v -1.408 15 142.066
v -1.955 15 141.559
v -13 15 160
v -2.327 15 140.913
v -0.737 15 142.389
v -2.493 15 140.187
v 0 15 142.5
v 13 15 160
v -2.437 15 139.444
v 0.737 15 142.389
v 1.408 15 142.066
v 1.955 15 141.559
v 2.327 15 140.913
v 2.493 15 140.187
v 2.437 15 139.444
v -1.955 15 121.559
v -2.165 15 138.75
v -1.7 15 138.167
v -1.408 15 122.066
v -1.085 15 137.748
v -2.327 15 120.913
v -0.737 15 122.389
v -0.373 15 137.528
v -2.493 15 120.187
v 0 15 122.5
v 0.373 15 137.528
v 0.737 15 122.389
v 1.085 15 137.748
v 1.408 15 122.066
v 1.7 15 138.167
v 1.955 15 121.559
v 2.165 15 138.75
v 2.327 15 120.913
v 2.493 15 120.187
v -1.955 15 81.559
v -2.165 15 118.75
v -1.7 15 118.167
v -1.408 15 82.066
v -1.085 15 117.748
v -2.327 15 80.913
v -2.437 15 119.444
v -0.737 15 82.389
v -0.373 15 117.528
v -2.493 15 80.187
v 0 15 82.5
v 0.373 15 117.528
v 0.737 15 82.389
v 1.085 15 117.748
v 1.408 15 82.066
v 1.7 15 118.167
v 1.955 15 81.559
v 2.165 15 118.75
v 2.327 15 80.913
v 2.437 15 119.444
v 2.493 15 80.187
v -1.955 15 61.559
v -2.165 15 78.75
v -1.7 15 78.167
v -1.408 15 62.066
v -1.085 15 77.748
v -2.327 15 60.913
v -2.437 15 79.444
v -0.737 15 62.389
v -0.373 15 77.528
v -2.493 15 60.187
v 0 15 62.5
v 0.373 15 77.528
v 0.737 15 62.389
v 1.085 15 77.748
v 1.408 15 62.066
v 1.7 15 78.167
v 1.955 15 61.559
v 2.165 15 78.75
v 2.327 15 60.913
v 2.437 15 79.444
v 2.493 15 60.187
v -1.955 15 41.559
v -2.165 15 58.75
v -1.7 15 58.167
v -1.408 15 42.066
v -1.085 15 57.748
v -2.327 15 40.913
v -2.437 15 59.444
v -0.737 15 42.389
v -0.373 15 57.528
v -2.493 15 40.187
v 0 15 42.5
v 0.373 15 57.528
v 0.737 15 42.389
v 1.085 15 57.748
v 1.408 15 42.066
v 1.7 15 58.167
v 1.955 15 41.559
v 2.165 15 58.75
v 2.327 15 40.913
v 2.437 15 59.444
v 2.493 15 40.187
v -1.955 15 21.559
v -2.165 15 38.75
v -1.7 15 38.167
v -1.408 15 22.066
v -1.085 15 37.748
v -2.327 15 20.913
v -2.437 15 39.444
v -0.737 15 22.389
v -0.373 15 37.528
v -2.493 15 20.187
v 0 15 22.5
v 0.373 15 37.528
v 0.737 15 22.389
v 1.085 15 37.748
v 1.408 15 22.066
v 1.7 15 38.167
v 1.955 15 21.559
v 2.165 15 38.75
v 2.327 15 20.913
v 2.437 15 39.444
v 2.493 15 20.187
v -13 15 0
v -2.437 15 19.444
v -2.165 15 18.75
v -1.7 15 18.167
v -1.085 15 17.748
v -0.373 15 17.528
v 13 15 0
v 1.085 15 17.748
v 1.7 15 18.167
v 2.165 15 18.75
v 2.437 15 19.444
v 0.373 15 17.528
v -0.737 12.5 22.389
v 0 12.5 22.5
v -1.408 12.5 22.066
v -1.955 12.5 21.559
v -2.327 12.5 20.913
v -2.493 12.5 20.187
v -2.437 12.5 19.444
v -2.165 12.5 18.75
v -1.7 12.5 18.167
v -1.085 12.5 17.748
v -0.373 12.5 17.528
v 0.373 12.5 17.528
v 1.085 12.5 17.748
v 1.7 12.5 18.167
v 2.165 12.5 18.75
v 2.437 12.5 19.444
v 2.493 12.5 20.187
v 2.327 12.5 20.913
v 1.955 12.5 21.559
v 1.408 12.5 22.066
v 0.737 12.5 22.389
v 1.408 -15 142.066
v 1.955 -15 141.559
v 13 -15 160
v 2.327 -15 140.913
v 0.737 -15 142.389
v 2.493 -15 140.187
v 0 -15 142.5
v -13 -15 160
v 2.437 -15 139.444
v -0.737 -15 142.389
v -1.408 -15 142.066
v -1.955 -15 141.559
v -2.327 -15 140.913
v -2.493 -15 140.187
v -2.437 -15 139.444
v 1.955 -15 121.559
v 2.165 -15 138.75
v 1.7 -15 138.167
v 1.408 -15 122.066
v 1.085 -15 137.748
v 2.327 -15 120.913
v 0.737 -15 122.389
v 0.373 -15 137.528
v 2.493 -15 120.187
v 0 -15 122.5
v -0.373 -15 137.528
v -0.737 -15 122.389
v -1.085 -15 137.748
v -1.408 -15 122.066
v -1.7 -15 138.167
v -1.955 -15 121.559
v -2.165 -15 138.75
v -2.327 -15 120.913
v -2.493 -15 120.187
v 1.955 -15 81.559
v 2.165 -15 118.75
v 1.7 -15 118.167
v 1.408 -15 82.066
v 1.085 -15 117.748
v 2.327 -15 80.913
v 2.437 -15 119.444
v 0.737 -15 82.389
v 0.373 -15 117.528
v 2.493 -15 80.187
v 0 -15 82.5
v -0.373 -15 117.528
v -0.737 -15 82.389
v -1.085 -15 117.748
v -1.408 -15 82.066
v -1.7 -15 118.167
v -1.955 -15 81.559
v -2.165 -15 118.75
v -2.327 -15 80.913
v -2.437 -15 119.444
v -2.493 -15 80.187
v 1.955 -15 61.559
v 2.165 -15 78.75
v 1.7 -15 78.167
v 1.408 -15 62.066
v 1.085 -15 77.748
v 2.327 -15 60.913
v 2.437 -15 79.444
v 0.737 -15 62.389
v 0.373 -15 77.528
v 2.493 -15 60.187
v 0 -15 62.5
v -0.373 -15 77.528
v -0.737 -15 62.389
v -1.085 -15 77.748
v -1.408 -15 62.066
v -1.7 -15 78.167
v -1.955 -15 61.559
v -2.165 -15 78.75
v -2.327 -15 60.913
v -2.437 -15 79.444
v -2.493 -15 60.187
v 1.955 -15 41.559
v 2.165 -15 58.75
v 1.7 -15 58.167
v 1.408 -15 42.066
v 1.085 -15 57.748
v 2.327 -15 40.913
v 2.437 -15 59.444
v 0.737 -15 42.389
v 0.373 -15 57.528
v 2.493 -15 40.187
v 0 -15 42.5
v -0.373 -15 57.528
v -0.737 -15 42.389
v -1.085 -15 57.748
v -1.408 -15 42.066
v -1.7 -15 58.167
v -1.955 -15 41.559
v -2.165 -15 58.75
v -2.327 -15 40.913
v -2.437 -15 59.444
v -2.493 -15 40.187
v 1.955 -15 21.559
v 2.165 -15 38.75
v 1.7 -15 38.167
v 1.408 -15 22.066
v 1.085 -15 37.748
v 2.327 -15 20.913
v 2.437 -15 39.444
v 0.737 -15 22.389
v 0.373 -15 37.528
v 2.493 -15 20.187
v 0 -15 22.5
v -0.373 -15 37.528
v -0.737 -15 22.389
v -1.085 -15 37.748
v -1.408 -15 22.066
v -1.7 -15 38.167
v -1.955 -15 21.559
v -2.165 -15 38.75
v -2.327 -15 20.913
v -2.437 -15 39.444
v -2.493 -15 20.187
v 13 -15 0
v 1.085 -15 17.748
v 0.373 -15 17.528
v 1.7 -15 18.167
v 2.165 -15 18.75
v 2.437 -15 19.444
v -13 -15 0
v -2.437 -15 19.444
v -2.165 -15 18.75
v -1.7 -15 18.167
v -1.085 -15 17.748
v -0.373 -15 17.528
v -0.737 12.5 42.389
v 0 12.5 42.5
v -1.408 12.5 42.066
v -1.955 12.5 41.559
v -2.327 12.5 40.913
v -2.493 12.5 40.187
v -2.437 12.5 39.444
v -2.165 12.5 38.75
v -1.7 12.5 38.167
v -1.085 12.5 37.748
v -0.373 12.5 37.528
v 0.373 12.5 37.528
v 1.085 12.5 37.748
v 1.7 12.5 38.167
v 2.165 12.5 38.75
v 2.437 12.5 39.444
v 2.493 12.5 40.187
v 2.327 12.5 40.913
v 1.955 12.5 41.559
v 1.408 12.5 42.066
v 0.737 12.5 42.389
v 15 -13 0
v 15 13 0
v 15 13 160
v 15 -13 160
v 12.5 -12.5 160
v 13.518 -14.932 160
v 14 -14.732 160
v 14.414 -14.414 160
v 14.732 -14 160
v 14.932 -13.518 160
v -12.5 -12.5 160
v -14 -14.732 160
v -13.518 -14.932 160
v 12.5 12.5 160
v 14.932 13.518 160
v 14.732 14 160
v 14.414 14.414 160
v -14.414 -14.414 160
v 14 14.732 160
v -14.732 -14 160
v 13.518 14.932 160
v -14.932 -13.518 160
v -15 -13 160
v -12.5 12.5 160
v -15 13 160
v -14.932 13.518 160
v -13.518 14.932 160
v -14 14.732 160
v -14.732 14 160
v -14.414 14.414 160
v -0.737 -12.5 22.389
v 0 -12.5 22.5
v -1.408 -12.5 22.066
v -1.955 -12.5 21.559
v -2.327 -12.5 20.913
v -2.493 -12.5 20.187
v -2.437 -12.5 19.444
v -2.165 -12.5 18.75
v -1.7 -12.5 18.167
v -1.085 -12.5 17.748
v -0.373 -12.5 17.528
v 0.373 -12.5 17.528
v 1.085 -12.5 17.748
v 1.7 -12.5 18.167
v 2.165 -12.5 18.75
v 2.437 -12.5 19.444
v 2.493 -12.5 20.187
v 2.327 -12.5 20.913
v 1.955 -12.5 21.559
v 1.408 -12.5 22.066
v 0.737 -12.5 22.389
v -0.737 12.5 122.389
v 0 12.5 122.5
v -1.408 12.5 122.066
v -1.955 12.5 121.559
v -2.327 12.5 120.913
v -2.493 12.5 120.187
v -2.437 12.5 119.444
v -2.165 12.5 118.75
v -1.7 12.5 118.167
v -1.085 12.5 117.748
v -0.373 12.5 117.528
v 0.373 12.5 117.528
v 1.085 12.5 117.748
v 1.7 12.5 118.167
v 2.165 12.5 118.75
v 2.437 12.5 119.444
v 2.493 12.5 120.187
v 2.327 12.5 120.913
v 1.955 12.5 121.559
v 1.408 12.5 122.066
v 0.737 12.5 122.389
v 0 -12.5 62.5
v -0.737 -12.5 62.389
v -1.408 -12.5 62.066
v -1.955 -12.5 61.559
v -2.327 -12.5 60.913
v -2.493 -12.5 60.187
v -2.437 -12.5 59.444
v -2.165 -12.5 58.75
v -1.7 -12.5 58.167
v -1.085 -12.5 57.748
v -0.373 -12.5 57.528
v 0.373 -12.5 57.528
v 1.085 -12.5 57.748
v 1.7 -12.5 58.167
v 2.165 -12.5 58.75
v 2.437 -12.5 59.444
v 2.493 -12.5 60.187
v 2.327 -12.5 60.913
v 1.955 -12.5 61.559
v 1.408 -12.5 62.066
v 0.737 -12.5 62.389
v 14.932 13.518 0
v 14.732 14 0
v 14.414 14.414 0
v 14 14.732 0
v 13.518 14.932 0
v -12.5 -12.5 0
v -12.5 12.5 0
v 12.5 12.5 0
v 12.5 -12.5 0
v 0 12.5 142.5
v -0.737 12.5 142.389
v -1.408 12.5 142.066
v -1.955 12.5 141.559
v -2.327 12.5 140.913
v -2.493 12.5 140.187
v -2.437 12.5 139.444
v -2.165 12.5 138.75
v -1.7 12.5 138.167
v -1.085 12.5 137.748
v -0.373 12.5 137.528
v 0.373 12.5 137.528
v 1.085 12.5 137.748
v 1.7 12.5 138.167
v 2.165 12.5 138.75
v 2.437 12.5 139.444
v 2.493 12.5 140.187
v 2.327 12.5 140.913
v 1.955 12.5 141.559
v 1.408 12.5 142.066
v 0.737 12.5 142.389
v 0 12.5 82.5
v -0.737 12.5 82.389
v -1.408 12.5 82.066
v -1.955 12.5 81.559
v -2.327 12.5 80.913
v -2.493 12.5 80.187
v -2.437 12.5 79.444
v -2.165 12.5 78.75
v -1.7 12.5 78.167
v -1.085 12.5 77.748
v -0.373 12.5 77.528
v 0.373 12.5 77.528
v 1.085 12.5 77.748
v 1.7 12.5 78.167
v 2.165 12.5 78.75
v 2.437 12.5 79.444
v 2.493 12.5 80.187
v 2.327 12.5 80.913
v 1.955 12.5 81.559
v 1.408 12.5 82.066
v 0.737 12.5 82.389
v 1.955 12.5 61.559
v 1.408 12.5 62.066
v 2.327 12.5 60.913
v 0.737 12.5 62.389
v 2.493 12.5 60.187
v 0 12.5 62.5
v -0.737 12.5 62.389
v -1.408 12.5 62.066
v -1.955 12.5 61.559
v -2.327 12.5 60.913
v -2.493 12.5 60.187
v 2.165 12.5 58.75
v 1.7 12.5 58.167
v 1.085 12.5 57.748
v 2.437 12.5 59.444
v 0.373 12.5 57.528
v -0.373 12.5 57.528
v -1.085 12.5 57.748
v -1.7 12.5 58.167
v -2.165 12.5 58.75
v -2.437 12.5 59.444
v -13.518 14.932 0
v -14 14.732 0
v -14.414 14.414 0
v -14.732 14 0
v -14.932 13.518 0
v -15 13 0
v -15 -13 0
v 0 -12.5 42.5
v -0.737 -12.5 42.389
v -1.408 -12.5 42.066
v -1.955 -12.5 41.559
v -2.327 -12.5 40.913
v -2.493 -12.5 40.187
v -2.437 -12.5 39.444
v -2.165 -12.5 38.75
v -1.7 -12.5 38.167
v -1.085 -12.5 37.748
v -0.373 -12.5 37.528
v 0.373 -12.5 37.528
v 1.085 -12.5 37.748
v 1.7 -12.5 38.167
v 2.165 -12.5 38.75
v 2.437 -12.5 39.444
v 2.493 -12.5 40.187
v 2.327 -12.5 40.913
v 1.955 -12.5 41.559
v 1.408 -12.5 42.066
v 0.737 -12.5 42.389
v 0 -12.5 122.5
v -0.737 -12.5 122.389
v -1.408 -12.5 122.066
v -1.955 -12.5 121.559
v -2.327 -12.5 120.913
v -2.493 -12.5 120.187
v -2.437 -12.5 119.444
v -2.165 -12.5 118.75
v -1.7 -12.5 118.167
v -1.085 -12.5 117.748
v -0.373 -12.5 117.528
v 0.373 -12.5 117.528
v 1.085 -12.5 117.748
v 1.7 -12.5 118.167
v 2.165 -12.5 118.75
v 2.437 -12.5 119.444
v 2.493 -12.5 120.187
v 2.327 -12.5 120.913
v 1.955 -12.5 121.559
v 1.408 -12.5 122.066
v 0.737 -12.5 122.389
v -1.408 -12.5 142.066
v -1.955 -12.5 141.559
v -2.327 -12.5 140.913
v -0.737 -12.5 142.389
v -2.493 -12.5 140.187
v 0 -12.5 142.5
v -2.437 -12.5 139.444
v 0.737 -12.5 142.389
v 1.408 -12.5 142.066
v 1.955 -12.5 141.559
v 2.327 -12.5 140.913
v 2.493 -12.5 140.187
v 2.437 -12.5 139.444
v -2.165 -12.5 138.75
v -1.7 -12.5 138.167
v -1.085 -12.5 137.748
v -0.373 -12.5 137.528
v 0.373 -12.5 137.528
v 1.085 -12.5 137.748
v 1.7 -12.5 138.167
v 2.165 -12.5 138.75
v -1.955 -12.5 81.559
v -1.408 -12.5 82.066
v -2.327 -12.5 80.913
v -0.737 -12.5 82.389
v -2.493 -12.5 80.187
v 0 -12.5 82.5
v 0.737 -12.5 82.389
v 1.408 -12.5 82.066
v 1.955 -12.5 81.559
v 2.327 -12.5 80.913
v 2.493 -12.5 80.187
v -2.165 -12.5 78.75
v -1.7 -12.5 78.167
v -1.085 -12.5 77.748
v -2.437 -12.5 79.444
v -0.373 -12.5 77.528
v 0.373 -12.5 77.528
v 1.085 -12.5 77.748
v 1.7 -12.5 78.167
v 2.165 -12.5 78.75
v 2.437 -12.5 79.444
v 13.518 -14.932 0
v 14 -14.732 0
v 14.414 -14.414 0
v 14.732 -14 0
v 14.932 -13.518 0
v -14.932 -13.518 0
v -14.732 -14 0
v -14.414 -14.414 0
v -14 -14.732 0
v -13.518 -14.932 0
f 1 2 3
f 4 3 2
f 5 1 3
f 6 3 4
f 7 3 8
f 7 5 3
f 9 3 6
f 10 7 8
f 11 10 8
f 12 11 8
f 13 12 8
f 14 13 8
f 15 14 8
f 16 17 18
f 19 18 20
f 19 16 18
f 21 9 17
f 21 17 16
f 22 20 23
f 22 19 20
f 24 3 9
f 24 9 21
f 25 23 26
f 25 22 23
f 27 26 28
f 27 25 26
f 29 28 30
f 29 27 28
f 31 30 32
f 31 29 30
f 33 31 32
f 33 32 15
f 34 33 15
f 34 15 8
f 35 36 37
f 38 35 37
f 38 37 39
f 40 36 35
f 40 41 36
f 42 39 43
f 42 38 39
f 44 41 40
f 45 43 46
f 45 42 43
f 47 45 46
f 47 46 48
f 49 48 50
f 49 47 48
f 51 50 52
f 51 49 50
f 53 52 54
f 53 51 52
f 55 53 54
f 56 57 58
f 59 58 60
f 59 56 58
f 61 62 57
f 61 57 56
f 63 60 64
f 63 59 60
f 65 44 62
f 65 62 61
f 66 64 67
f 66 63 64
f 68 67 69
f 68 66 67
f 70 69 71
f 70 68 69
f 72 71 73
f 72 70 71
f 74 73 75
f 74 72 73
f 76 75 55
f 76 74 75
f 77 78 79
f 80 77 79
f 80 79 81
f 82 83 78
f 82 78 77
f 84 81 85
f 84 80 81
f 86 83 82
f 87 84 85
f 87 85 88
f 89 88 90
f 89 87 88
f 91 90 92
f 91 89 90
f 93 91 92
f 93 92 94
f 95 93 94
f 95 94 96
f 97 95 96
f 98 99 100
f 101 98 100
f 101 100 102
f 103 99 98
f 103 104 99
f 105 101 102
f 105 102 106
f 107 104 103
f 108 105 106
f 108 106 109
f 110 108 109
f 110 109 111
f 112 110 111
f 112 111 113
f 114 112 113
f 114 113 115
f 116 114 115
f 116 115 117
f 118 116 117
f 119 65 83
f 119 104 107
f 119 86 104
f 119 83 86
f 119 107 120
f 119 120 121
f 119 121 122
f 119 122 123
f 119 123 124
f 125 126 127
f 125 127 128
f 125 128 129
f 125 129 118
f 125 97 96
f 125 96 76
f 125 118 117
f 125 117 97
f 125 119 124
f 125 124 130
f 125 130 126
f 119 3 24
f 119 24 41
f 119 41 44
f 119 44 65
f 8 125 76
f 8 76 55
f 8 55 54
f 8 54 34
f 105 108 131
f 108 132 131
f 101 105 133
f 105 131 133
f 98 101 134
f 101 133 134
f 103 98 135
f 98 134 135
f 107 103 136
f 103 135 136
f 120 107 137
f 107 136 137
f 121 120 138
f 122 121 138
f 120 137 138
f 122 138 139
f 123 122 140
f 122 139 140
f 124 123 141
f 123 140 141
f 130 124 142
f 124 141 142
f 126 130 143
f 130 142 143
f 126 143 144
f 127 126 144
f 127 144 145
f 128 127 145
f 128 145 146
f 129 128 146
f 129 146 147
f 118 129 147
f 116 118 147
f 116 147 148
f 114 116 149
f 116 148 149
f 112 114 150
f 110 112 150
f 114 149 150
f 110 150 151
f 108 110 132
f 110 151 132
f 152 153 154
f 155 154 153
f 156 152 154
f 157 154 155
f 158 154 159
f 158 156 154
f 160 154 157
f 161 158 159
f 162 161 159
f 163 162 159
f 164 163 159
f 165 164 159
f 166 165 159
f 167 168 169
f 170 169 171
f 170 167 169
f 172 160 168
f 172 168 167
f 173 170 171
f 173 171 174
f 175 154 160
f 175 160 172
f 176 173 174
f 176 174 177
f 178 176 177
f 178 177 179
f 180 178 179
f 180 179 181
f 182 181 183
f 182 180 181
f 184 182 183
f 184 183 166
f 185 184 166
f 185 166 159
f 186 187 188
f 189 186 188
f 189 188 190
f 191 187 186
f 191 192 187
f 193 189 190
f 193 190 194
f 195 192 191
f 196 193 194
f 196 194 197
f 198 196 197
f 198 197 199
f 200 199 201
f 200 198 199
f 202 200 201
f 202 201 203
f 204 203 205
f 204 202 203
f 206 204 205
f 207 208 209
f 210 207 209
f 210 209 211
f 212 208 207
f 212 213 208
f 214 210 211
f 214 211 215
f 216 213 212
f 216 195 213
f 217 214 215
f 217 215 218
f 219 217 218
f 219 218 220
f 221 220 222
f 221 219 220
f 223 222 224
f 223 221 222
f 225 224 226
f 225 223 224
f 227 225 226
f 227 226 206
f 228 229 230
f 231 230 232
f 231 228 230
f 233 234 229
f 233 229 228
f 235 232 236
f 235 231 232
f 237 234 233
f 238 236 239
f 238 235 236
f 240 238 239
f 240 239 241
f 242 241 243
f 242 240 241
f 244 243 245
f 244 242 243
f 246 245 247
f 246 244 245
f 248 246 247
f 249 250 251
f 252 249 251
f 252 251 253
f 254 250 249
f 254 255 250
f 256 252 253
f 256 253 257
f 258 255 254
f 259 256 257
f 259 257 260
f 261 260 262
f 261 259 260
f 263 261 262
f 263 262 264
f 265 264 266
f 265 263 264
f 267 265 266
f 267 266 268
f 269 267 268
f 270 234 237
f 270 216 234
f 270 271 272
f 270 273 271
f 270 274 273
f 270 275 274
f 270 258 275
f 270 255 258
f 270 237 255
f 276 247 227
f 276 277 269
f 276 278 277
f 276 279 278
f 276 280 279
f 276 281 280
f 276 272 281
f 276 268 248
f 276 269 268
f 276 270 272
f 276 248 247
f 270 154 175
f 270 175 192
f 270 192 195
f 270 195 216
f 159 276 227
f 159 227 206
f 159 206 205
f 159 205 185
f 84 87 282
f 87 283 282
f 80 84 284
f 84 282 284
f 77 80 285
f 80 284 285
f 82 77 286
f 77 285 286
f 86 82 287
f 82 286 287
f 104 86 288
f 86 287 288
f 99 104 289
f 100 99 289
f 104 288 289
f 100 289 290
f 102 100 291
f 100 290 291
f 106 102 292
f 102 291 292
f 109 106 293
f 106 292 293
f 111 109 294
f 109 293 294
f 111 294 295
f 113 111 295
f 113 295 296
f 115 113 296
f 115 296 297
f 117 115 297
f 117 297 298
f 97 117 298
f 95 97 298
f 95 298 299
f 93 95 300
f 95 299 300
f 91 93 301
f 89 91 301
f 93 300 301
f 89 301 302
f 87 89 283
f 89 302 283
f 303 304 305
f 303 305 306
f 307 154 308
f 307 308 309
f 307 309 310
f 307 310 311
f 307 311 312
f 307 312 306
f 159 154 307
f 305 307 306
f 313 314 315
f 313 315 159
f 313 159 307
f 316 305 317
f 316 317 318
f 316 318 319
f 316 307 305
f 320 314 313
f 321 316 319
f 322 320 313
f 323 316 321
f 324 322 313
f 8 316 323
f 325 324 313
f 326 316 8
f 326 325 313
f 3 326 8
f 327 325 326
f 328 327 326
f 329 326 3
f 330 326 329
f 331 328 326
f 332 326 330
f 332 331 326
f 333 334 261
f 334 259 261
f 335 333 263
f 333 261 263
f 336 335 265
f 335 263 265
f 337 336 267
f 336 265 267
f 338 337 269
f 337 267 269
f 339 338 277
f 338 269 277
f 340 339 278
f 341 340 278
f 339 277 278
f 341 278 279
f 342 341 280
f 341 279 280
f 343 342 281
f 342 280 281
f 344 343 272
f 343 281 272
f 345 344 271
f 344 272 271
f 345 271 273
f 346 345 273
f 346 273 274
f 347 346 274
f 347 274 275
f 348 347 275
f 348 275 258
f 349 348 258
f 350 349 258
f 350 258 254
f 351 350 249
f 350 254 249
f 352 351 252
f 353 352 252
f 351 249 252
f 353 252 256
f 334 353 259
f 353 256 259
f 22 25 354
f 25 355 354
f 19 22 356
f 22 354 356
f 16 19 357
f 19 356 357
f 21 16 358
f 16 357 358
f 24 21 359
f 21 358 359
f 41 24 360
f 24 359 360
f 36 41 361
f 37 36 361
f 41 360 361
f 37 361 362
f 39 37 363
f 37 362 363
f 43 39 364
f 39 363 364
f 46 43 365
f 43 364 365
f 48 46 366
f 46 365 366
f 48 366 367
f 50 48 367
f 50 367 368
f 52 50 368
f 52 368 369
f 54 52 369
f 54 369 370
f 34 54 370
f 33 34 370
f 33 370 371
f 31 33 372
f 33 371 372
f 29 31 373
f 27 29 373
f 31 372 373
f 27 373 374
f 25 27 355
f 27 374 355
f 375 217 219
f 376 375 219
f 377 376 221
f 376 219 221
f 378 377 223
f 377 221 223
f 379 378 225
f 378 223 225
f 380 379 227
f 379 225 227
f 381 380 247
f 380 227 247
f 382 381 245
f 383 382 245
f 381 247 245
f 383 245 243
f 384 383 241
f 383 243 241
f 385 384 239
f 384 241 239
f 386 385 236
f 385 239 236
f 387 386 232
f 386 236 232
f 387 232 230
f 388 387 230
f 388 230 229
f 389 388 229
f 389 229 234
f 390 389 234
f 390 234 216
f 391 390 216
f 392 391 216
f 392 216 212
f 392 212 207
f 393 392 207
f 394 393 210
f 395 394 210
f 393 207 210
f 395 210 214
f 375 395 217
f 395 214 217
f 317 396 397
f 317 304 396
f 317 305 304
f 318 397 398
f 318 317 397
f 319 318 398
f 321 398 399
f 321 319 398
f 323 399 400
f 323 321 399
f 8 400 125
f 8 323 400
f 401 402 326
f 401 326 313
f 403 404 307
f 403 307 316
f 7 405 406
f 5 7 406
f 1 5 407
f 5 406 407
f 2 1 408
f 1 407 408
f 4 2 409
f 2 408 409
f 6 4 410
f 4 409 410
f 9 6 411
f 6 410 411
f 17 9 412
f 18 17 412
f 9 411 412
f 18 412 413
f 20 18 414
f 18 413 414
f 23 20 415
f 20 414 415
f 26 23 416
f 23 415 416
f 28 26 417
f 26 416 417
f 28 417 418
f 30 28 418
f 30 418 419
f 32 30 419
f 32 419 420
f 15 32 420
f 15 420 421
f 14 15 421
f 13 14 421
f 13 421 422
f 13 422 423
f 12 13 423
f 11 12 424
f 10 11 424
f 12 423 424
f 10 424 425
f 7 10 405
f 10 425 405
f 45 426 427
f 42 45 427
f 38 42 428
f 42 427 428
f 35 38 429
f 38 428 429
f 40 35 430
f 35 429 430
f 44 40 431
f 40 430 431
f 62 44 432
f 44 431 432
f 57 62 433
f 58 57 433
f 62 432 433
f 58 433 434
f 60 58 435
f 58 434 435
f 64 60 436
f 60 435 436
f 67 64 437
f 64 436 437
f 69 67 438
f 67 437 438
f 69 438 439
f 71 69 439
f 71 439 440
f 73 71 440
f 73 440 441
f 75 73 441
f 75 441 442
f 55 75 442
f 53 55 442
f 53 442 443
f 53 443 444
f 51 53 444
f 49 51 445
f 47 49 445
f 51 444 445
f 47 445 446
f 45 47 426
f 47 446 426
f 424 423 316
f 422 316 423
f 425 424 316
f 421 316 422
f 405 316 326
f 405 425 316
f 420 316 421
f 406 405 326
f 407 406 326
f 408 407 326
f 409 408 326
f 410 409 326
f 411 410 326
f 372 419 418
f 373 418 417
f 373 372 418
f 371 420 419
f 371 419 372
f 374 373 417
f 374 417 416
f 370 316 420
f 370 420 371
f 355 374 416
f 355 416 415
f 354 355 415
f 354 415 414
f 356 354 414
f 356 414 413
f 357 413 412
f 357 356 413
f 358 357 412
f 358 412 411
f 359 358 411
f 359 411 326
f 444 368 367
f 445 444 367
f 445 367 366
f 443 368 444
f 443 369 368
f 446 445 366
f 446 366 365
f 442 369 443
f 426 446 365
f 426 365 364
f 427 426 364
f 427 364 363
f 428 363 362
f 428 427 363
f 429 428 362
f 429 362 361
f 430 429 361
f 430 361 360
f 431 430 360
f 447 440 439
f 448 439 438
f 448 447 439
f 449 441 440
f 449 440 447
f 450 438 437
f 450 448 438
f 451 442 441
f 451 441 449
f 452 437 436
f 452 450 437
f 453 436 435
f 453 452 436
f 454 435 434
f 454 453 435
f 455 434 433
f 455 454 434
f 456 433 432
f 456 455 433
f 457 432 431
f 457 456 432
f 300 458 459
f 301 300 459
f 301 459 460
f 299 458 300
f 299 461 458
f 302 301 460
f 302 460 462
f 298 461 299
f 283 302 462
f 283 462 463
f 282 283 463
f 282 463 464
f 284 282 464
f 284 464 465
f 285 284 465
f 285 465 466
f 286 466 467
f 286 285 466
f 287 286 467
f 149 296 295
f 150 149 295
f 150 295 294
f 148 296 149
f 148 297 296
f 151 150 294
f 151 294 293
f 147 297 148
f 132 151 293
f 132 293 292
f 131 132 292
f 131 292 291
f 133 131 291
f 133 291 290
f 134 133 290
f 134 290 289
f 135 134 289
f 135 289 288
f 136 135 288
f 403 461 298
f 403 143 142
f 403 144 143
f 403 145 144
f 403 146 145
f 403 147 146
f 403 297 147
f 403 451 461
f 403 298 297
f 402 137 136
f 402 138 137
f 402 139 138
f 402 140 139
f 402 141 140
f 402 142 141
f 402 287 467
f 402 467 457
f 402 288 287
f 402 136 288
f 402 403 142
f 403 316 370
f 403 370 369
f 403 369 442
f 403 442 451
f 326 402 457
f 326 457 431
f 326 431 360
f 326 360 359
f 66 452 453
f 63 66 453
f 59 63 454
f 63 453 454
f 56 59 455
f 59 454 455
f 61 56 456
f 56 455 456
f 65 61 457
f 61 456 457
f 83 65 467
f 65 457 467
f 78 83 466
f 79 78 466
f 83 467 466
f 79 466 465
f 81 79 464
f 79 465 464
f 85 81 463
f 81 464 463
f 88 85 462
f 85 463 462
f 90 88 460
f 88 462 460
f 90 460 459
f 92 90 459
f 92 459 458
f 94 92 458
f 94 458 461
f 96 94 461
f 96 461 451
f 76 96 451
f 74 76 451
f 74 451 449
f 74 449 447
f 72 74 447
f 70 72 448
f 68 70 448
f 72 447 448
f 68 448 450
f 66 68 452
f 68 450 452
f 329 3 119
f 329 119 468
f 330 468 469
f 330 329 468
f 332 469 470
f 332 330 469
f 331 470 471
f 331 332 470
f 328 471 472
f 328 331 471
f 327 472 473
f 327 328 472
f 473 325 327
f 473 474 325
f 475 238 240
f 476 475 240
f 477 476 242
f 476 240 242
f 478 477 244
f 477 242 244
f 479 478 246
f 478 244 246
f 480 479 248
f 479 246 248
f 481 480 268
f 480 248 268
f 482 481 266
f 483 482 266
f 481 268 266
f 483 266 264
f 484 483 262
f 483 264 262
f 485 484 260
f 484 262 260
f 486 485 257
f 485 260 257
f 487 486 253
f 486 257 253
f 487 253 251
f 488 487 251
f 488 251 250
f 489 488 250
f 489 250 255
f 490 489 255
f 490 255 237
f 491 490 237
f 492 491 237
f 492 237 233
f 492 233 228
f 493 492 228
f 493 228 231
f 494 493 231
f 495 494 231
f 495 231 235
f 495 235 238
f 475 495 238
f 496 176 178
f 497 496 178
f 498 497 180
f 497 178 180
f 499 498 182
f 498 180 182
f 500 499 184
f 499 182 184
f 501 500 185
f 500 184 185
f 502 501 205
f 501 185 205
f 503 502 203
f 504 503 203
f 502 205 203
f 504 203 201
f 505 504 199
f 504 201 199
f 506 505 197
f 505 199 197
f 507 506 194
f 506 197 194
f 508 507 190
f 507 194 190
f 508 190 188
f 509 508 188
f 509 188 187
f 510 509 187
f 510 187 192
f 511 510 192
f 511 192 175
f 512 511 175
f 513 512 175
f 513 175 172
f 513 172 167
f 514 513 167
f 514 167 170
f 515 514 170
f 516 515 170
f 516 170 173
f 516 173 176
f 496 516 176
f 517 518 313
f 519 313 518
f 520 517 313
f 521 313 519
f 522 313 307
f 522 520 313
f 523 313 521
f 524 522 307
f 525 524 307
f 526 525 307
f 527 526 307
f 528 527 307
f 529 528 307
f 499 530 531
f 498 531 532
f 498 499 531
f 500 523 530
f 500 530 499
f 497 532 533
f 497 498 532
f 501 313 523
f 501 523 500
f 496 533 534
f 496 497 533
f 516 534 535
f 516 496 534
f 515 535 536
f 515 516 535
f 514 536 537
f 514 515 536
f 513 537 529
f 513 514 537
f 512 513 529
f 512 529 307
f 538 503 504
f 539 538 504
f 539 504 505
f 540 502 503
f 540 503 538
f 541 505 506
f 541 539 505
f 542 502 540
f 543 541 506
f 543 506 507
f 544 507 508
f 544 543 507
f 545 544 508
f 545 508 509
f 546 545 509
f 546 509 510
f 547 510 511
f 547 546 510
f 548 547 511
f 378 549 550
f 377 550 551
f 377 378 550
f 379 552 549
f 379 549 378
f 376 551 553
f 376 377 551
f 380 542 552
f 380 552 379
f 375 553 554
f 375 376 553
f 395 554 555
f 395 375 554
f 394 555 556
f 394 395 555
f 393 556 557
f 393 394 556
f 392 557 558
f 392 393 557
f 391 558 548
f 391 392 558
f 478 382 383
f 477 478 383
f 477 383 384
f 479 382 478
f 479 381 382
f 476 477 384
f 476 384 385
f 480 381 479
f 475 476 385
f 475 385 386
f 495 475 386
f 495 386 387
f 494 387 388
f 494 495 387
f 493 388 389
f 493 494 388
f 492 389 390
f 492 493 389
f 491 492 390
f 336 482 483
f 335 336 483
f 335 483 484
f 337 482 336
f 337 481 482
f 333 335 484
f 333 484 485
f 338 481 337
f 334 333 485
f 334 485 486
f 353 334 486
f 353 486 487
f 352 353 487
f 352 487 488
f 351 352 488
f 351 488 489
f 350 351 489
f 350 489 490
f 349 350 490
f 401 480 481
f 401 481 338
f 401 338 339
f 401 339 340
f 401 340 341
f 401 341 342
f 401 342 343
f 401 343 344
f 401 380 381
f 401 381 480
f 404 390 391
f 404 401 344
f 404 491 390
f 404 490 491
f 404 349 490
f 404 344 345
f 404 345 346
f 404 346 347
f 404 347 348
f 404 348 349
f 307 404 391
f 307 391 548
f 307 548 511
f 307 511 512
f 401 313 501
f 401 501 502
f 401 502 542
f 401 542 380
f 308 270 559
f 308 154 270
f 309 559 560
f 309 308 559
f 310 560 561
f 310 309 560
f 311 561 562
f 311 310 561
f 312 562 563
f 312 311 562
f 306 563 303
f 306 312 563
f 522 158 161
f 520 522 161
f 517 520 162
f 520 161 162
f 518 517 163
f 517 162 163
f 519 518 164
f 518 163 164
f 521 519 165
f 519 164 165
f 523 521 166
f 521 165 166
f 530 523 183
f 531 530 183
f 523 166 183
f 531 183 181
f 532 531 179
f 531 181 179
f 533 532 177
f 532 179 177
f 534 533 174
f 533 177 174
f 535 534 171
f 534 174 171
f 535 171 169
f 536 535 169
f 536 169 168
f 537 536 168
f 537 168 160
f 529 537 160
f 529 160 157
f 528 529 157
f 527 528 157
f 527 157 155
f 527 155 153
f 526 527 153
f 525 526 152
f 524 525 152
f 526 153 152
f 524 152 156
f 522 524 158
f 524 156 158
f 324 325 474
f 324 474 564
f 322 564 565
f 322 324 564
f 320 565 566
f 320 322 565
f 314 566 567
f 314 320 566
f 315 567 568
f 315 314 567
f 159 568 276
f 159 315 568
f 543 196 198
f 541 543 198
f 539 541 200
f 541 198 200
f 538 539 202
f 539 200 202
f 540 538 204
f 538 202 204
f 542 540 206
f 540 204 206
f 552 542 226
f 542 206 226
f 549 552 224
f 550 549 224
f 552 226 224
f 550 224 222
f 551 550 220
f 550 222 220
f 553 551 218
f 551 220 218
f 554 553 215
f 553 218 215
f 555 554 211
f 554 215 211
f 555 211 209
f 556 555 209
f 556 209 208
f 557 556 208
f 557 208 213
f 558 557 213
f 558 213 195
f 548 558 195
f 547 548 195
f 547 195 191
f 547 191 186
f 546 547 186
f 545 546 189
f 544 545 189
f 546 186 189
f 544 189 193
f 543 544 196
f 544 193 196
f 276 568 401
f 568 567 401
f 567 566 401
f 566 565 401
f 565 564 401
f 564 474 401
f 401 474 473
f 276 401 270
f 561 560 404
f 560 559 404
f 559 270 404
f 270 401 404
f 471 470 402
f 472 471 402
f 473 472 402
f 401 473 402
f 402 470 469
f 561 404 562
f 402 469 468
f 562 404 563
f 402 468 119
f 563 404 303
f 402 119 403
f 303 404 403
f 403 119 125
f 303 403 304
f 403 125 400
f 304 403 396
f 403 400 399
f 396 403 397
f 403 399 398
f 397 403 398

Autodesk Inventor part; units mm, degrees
ref_plane "YZ Plane" through (0, 0, 0) normal (1, 0, 0) x (0, 1, 0)
ref_plane "XZ Plane" through (0, 0, 0) normal (0, 1, 0) x (-1, 0, 0)
sketch "Sketch1" plane through (0, 0, 0) normal (0, 0, 1) x (1, 0, 0)
  line L0 (-15, 15) -> (15, 15)
  line L1 (15, 15) -> (15, -15)
  line L2 (15, -15) -> (-15, -15)
  line L3 (-15, -15) -> (-15, 15)
  line L4 (12.5, 12.5) -> (-12.5, 12.5)
  line L5 (-12.5, 12.5) -> (-12.5, -12.5)
  line L6 (-12.5, -12.5) -> (12.5, -12.5)
  line L7 (12.5, -12.5) -> (12.5, 12.5)
  point P0 (0, 0)
  dimension "d0" = 30
  dimension "d1" = 30
  dimension "d2" = 15
  dimension "d3" = 15
  dimension "d4" = 2.5
extrude "Extrusion1" add sketch "Sketch1" along normal blind 1000
fillet "Fillet1" radius 2 4 edges at (15, 15, 500) (-15, 15, 500) (-15, -15, 500) (15, -15, 500)
ref_plane "Work Plane1" through (0, 0, 160) normal (0, 0, -1) x (-1, 0, 0)
split "Split1" plane through (0, 0, 160) removes the side toward (0, 0, 1)
sketch "Sketch2" plane through (-13, 15, 0) normal (0, 1, 0) x (1, 0, 0)
  point P0 (13, 0)
  point P1 (13, -20)
  dimension "d9" = 0
  dimension "d10" = 20
hole "Hole1" at (0, 15, 20) direction (0, -1, 0) diameter 5 end through all
pattern_linear "Rectangular Pattern1" count 4 spacing 20 along (0, 0, 1) of "Hole1"
sketch "Sketch3" plane through (-13, 15, 0) normal (0, 1, 0) x (1, 0, 0)
  line L0 (0, -160) -> (26, -160) projected
  point P0 (13, 0)
  point P1 (13, -140)
  point P2 (13, -120)
  dimension "d21" = 20
  dimension "d22" = 0
  dimension "d30" = 0
  dimension "d31" = 20
hole "Hole2" at (0, 15, 140) at (0, 15, 120) direction (0, -1, 0) diameter 5 end through all
equation "\"d0\" = sm_varx_squareBarDimension"
equation "\"d1\" = d0"
equation "\"d2\" = 0.5 * d1"
equation "\"d3\" = 0.5 * d0"
equation "\"d4\" = sm_varx_squareBarThickness"
equation "\"d10\" = 0.666667 * sm_varx_squareBarDimension"
equation "\"d11\" = sm_varx_pinPlate_holeDiameter"
equation "\"d20\" = 0.666667 * sm_varx_squareBarDimension"
equation "\"d31\" = d21"
equation "\"d23\" = sm_varx_pinPlate_holeDiameter"
equation "\"sm_varx_squareBarDimension\" = 30"
equation "\"sm_varx_squareBarThickness\" = 2.5"
equation "\"sm_varx_pinPlate_holeDiameter\" = 5"
equation "\"hoop_angle_z\" = 45deg"
equation "\"hoop_bearing_length\" = 5deg"
equation "\"hoop_cable_diam\" = 5"
equation "\"hoop_cable_pulley_diam\" = 22"
equation "\"hoop_thickness_large\" = 4"
equation "\"hoop_thickness_medium\" = 3.2"
equation "\"hoop_thickness_small\" = 2"
equation "\"hoop_width_large\" = 51"
equation "\"hoop_width_medium\" = 33.7"
equation "\"hoop_width_small\" = 25.4"
equation "\"rack_tooth_addendum\" = 5"
equation "\"rack_tooth_dedendum\" = 5"
equation "\"rack_tooth_thickness\" = 5"
equation "\"secure_arm_angle\" = 35deg"
equation "\"secure_arm_radii\" = 9"
equation "\"support_baseClamp_platformLengthBuffer\" = 35"
equation "\"support_baseClamp_platformThickness\" = 15"
equation "\"support_baseClamp_platformWidthBuffer\" = 0"
equation "\"support_baseClamp_sleeveHoleDiameter\" = 12"
equation "\"support_baseClamp_sleeveSweepTerminationAngle\" = 55deg"
equation "\"support_baseClamp_thickness\" = 8"
equation "\"support_frame_endHoleBuffer\" = 45"
equation "\"support_frame_squareBarFillet\" = 2"
equation "\"support_frame_squareBarThickness\" = 5"
equation "\"hoop_tabs_thickness\" = 6"
equation "\"hoop_tabs_hole\" = 12"
equation "\"wheelchair_deployed_width\" = 635"
equation "\"wheelchair_deployed_length\" = 1067"
equation "\"wheelchair_deployed_height\" = 914"
equation "\"sm_varx_pinPlate_thickness\" = 5"
equation "\"sm_varx_member_tolerance\" = 0"
equation "\"hoop_bushing12_radialInterference\" = 0"
equation "\"hoop_bushing23_radialInterference\" = 0"
equation "\"hoop_bushing23_od\" = -2 * hoop_thickness_medium + hoop_width_medium + hoop_bushing23_radialInterference"
equation "\"hoop_bushing23_thickness\" = -hoop_width_small + hoop_bushing23_od - 2 * hoop_bushing23_radialInterference"
equation "\"hoop_bushing12_od\" = -2 * hoop_thickness_large + hoop_width_large + hoop_bushing12_radialInterference"
equation "\"wheelchatir_pos_deploy_angle_0\" = 65deg"
equation "\"wheelchatir_pos_store_angle_0\" = 90deg"
equation "\"wheelchatir_pos_deploy_angle_1\" = 20deg"
equation "\"wheelchatir_pos_store_angle_1\" = 20deg"
equation "\"hoop_bushing12_thickness\" = -hoop_width_medium + hoop_bushing12_od - 2 * hoop_bushing12_radialInterference"
properties part number "member_vertical" material "Steel, Galvanized"
